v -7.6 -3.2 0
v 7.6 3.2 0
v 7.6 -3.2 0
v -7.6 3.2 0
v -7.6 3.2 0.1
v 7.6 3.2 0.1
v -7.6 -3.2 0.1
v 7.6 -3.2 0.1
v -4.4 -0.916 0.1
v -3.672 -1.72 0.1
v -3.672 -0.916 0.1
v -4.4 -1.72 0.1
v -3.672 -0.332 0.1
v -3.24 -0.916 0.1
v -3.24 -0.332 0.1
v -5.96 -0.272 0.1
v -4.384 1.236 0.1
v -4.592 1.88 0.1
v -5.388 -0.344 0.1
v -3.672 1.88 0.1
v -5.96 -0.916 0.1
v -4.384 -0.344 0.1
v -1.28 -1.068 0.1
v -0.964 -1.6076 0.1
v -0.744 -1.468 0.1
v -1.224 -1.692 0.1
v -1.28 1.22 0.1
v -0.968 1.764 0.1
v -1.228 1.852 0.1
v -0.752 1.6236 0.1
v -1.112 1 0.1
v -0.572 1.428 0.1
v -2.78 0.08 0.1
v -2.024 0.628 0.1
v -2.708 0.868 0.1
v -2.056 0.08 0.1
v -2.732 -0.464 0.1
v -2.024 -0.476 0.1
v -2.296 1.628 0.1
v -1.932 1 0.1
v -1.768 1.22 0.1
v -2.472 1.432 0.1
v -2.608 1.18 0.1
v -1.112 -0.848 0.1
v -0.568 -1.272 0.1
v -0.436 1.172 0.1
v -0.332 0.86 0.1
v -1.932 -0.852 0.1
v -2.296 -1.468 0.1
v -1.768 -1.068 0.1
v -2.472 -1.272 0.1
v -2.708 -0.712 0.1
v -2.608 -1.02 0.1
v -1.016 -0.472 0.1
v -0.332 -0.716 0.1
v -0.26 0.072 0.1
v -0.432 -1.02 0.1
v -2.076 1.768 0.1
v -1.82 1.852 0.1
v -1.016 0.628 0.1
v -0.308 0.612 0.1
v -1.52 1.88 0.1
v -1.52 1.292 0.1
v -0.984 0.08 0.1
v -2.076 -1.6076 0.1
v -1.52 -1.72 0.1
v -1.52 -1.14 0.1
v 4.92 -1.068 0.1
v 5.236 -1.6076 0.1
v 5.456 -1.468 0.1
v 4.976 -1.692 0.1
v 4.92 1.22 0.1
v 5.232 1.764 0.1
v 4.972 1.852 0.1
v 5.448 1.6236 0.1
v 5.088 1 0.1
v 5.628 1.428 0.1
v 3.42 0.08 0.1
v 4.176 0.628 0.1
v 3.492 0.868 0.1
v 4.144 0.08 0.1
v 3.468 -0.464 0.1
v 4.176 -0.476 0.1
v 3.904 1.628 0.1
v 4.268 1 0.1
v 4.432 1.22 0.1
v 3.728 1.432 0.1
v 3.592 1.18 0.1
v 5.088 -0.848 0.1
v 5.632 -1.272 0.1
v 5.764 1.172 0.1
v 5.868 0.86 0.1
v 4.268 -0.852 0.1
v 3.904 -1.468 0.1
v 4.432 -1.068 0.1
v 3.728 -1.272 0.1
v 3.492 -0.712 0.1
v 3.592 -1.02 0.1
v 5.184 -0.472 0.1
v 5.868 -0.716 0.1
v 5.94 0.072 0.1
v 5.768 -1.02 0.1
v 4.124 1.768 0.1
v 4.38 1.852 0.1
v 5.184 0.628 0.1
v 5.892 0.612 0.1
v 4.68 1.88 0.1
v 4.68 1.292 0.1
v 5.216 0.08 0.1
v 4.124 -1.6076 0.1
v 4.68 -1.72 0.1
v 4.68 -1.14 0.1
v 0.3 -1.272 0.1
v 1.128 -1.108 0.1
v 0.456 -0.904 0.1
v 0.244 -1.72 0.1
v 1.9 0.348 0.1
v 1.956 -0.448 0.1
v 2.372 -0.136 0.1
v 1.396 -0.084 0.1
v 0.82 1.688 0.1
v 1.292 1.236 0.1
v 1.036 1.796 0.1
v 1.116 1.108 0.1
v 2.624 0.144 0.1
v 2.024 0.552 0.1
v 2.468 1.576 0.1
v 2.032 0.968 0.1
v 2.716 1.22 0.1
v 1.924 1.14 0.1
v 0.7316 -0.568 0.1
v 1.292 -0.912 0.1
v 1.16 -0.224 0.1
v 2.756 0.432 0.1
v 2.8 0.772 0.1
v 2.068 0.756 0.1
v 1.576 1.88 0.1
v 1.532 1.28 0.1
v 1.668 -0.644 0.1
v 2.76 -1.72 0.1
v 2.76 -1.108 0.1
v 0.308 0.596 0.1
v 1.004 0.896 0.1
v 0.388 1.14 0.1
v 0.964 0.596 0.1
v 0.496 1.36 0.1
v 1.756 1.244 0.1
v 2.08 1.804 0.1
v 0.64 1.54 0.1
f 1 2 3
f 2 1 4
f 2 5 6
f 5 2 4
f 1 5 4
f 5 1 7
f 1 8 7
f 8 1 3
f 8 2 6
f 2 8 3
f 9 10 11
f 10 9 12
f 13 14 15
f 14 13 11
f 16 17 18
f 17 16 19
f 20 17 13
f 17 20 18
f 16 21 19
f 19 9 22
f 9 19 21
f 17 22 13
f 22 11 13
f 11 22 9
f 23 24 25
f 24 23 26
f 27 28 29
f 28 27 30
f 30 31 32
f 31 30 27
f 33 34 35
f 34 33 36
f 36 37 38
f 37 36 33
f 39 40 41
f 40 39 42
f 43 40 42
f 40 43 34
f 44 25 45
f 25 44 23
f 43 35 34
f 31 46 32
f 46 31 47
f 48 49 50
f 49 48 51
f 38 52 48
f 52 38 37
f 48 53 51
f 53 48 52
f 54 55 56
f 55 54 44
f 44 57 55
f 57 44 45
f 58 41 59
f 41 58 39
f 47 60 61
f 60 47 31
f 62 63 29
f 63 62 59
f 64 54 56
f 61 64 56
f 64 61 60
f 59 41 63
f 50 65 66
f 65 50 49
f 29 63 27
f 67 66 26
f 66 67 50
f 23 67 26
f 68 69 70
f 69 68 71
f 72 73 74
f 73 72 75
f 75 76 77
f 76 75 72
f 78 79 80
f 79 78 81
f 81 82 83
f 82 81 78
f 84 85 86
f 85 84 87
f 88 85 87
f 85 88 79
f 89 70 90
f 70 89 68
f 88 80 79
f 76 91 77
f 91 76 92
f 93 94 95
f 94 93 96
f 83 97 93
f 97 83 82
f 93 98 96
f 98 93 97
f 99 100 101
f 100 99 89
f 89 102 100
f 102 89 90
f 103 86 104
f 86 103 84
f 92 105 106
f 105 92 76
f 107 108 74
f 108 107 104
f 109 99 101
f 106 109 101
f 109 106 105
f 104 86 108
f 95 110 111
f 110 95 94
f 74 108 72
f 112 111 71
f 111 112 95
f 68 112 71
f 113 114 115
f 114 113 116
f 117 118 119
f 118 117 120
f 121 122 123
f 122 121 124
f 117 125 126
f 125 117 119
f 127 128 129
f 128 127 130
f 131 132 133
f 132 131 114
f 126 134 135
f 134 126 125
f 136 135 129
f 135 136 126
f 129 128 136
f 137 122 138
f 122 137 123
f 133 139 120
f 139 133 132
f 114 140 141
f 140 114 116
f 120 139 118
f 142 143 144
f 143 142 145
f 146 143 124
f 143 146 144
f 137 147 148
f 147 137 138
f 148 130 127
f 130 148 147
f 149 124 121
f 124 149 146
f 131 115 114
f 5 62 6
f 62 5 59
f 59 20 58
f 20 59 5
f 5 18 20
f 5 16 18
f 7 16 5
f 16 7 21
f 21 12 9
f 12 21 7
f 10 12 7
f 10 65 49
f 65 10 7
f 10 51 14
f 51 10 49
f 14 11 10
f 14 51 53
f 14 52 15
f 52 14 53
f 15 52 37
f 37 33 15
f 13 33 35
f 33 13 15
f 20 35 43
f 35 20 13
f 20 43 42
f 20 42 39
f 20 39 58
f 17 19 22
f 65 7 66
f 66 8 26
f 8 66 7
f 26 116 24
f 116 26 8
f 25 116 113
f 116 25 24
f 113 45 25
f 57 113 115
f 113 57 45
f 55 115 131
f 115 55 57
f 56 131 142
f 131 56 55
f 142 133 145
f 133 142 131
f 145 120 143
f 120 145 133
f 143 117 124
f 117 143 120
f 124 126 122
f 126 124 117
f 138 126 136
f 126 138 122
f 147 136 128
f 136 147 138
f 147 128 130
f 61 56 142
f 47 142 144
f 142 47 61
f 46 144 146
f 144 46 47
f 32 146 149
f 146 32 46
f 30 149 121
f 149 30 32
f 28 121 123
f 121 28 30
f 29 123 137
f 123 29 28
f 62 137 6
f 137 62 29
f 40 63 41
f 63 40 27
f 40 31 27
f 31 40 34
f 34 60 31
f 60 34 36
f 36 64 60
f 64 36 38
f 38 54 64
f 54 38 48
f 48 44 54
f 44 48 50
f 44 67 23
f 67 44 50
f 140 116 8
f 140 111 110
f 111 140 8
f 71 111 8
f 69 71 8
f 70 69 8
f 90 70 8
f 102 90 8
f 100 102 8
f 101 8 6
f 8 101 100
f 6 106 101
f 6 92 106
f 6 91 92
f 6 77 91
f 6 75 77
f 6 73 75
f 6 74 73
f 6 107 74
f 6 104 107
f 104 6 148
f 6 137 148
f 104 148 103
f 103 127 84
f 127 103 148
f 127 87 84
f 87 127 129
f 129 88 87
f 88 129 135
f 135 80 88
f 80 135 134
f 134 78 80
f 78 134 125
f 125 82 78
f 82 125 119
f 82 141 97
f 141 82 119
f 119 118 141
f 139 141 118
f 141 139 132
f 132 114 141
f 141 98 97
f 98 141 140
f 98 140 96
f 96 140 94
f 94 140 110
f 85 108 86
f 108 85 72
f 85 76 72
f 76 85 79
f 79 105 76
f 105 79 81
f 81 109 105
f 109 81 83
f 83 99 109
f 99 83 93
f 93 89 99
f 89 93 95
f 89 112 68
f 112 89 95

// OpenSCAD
// file: ../p/box5-12.scad
use <../lib.scad>
function ldraw_lib__box5_12() = [
// 0 Box with 5 Faces without Any Edges
// 0 Name: box5-12.dat
// 0 Author: Chris Dee [cwdee]
// 0 !LDRAW_ORG Primitive UPDATE 2009-02
// 0 !LICENSE Licensed under CC BY 4.0 : see CAreadme.txt
// 
// 0 BFC CERTIFY CCW
  [0,"BFC","CERTIFY"],
  [0,"BFC","CCW"],
// 
// 0 !HISTORY 2009-09-03 [PTadmin] Official Update 2009-02
// 
// 
// 4 16 1 1 1 1 1 -1 -1 1 -1 -1 1 1
  [4,16,1,1,1,1,1,-1,-1,1,-1,-1,1,1],
// 4 16 -1 0 1 1 0 1 1 1 1 -1 1 1
  [4,16,-1,0,1,1,0,1,1,1,1,-1,1,1],
// 4 16 -1 0 -1 -1 0 1 -1 1 1 -1 1 -1
  [4,16,-1,0,-1,-1,0,1,-1,1,1,-1,1,-1],
// 4 16 1 0 -1 -1 0 -1 -1 1 -1 1 1 -1
  [4,16,1,0,-1,-1,0,-1,-1,1,-1,1,1,-1],
// 4 16 1 0 1 1 0 -1 1 1 -1 1 1 1
  [4,16,1,0,1,1,0,-1,1,1,-1,1,1,1],
// 0
];
module ldraw_lib__box5_12(step=0, col=false, unit=2/5, alt=false, line=0.2, solid=!$preview)
    makepoly(ldraw_lib__box5_12(), step=step, col=col, unit=unit, alt=alt, line=line, solid=solid);
ldraw_lib__box5_12(line=0.2);
// main file
use <../lib.scad>
use <../p/box5-12.scad>
function ldraw_lib__197885a() = [
// 0 Sticker  0.8 x  1.9 with White "4020" on Transparent Background
// 0 Name: 197885a.dat
// 0 Author: Takeshi Takahashi [RainbowDolphin]
// 0 !LDRAW_ORG Part UPDATE 2025-07
// 0 !LICENSE Licensed under CC BY 4.0 : see CAreadme.txt
// 
// 0 BFC CERTIFY CCW
  [0,"BFC","CERTIFY"],
  [0,"BFC","CCW"],
// 
// 0 !KEYWORDS Fire boat, Set 4020, ship
// 
// 0 !HISTORY 2025-07-27 [OrionP] Official Update 2025-07
// 
// 
// 1 16 0 -0.25 0 19 0 0 0 0.25 0 0 0 8 box5-12.dat
  [1,16,0,-0.25,0,19,0,0,0,0.25,0,0,0,8, ldraw_lib__box5_12()],
// 0 BFC NOCLIP
  [0,"BFC","NOCLIP"],
// 4 15 -11 -0.25 -4.3 -9.18 -0.25 -4.3 -9.18 -0.25 -2.29 -11 -0.25 -2.29
  [4,15,-11,-0.25,-4.3,-9.18,-0.25,-4.3,-9.18,-0.25,-2.29,-11,-0.25,-2.29],
// 4 15 -9.18 -0.25 -0.83 -9.18 -0.25 -2.29 -8.1 -0.25 -2.29 -8.1 -0.25 -0.83
  [4,15,-9.18,-0.25,-0.83,-9.18,-0.25,-2.29,-8.1,-0.25,-2.29,-8.1,-0.25,-0.83],
// 4 15 -13.47 -0.25 -0.86 -10.96 -0.25 3.09 -11.48 -0.25 4.7 -14.9 -0.25 -0.68
  [4,15,-13.47,-0.25,-0.86,-10.96,-0.25,3.09,-11.48,-0.25,4.7,-14.9,-0.25,-0.68],
// 4 15 -9.18 -0.25 4.7 -11.48 -0.25 4.7 -10.96 -0.25 3.09 -9.18 -0.25 -0.83
  [4,15,-9.18,-0.25,4.7,-11.48,-0.25,4.7,-10.96,-0.25,3.09,-9.18,-0.25,-0.83],
// 3 15 -14.9 -0.25 -0.68 -14.9 -0.25 -2.29 -13.47 -0.25 -0.86
  [3,15,-14.9,-0.25,-0.68,-14.9,-0.25,-2.29,-13.47,-0.25,-0.86],
// 4 15 -10.96 -0.25 -0.86 -13.47 -0.25 -0.86 -14.9 -0.25 -2.29 -11 -0.25 -2.29
  [4,15,-10.96,-0.25,-0.86,-13.47,-0.25,-0.86,-14.9,-0.25,-2.29,-11,-0.25,-2.29],
// 3 15 -10.96 -0.25 3.09 -10.96 -0.25 -0.86 -9.18 -0.25 -0.83
  [3,15,-10.96,-0.25,3.09,-10.96,-0.25,-0.86,-9.18,-0.25,-0.83],
// 4 15 -11 -0.25 -2.29 -9.18 -0.25 -2.29 -9.18 -0.25 -0.83 -10.96 -0.25 -0.86
  [4,15,-11,-0.25,-2.29,-9.18,-0.25,-2.29,-9.18,-0.25,-0.83,-10.96,-0.25,-0.86],
// 4 15 -1.86 -0.25 -3.67 -3.2 -0.25 -2.67 -3.06 -0.25 -4.23 -2.41 -0.25 -4.019
  [4,15,-1.86,-0.25,-3.67,-3.2,-0.25,-2.67,-3.06,-0.25,-4.23,-2.41,-0.25,-4.019],
// 4 15 -3.07 -0.25 4.63 -3.2 -0.25 3.05 -1.88 -0.25 4.059 -2.42 -0.25 4.41
  [4,15,-3.07,-0.25,4.63,-3.2,-0.25,3.05,-1.88,-0.25,4.059,-2.42,-0.25,4.41],
// 4 15 -1.43 -.25 3.57 -1.88 -.25 4.059 -3.2 -.25 3.05 -2.78 -.25 2.5
  [4,15,-1.43,-.25,3.57,-1.88,-.25,4.059,-3.2,-.25,3.05,-2.78,-.25,2.5],
// 4 15 -6.77 -0.25 2.17 -6.95 -0.25 0.2 -5.14 -0.25 0.2 -5.06 -0.25 1.57
  [4,15,-6.77,-0.25,2.17,-6.95,-0.25,0.2,-5.14,-0.25,0.2,-5.06,-0.25,1.57],
// 4 15 -6.95 -0.25 0.2 -6.83 -0.25 -1.16 -5.06 -0.25 -1.19 -5.14 -0.25 0.2
  [4,15,-6.95,-0.25,0.2,-6.83,-0.25,-1.16,-5.06,-0.25,-1.19,-5.14,-0.25,0.2],
// 4 15 -4.42 -0.25 3.05 -5.74 -0.25 4.07 -6.18 -0.25 3.58 -4.83 -0.25 2.5
  [4,15,-4.42,-0.25,3.05,-5.74,-0.25,4.07,-6.18,-0.25,3.58,-4.83,-0.25,2.5],
// 4 15 -4.83 -0.25 2.5 -6.18 -0.25 3.58 -6.52 -0.25 2.95 -5.06 -0.25 1.57
  [4,15,-4.83,-0.25,2.5,-6.18,-0.25,3.58,-6.52,-0.25,2.95,-5.06,-0.25,1.57],
// 4 15 -3.2 -0.25 -2.67 -1.86 -0.25 -3.67 -1.42 -0.25 -3.18 -2.78 -0.25 -2.12
  [4,15,-3.2,-0.25,-2.67,-1.86,-0.25,-3.67,-1.42,-0.25,-3.18,-2.78,-0.25,-2.12],
// 3 15 -6.52 -0.25 2.95 -6.77 -0.25 2.17 -5.06 -0.25 1.57
  [3,15,-6.52,-0.25,2.95,-6.77,-0.25,2.17,-5.06,-0.25,1.57],
// 4 15 -.83 -.25 2.15 -1.09 -.25 2.93 -1.43 -.25 3.57 -2.78 -.25 2.5
  [4,15,-.83,-.25,2.15,-1.09,-.25,2.93,-1.43,-.25,3.57,-2.78,-.25,2.5],
// 4 15 -4.42 -0.25 -2.67 -4.83 -0.25 -2.13 -6.18 -0.25 -3.18 -5.74 -0.25 -3.67
  [4,15,-4.42,-0.25,-2.67,-4.83,-0.25,-2.13,-6.18,-0.25,-3.18,-5.74,-0.25,-3.67],
// 4 15 -6.83 -.25 -1.16 -6.77 -.25 -1.78 -4.83 -.25 -2.13 -5.06 -.25 -1.19
  [4,15,-6.83,-.25,-1.16,-6.77,-.25,-1.78,-4.83,-.25,-2.13,-5.06,-.25,-1.19],
// 4 15 -6.77 -.25 -1.78 -6.52 -.25 -2.55 -6.18 -.25 -3.18 -4.83 -.25 -2.13
  [4,15,-6.77,-.25,-1.78,-6.52,-.25,-2.55,-6.18,-.25,-3.18,-4.83,-.25,-2.13],
// 4 15 -0.65 -0.25 0.18 -2.54 -0.25 -1.18 -2.78 -0.25 -2.12 -0.83 -0.25 -1.79
  [4,15,-0.65,-0.25,0.18,-2.54,-0.25,-1.18,-2.78,-0.25,-2.12,-0.83,-0.25,-1.79],
// 4 15 -1.42 -0.25 -3.18 -1.08 -0.25 -2.55 -0.83 -0.25 -1.79 -2.78 -0.25 -2.12
  [4,15,-1.42,-0.25,-3.18,-1.08,-0.25,-2.55,-0.83,-0.25,-1.79,-2.78,-0.25,-2.12],
// 4 15 -5.74 -0.25 4.07 -4.42 -0.25 3.05 -4.55 -0.25 4.63 -5.19 -0.25 4.42
  [4,15,-5.74,-0.25,4.07,-4.42,-0.25,3.05,-4.55,-0.25,4.63,-5.19,-0.25,4.42],
// 4 15 -2.78 -.25 2.5 -2.54 -.25 1.57 -.77 -.25 1.53 -.83 -.25 2.15
  [4,15,-2.78,-.25,2.5,-2.54,-.25,1.57,-.77,-.25,1.53,-.83,-.25,2.15],
// 4 15 -3.07 -0.25 4.63 -3.8 -0.25 4.7 -4.55 -0.25 4.63 -3.8 -0.25 3.23
  [4,15,-3.07,-0.25,4.63,-3.8,-0.25,4.7,-4.55,-0.25,4.63,-3.8,-0.25,3.23],
// 3 15 -2.46 -0.25 0.2 -2.54 -0.25 -1.18 -0.65 -0.25 0.18
  [3,15,-2.46,-0.25,0.2,-2.54,-0.25,-1.18,-0.65,-0.25,0.18],
// 4 15 -2.54 -0.25 1.57 -2.46 -0.25 0.2 -0.65 -0.25 0.18 -0.77 -0.25 1.53
  [4,15,-2.54,-0.25,1.57,-2.46,-0.25,0.2,-0.65,-0.25,0.18,-0.77,-0.25,1.53],
// 3 15 -4.55 -0.25 4.63 -4.42 -0.25 3.05 -3.8 -0.25 3.23
  [3,15,-4.55,-0.25,4.63,-4.42,-0.25,3.05,-3.8,-0.25,3.23],
// 4 15 -5.74 -0.25 -3.67 -5.19 -0.25 -4.019 -3.8 -0.25 -4.3 -4.42 -0.25 -2.67
  [4,15,-5.74,-0.25,-3.67,-5.19,-0.25,-4.019,-3.8,-0.25,-4.3,-4.42,-0.25,-2.67],
// 3 15 -3.07 -0.25 4.63 -3.8 -0.25 3.23 -3.2 -0.25 3.05
  [3,15,-3.07,-0.25,4.63,-3.8,-0.25,3.23,-3.2,-0.25,3.05],
// 4 15 -4.42 -0.25 -2.67 -3.8 -0.25 -4.3 -3.06 -0.25 -4.23 -3.8 -0.25 -2.85
  [4,15,-4.42,-0.25,-2.67,-3.8,-0.25,-4.3,-3.06,-0.25,-4.23,-3.8,-0.25,-2.85],
// 3 15 -3.2 -0.25 -2.67 -3.8 -0.25 -2.85 -3.06 -0.25 -4.23
  [3,15,-3.2,-0.25,-2.67,-3.8,-0.25,-2.85,-3.06,-0.25,-4.23],
// 4 15 13.64 -0.25 -3.67 12.3 -0.25 -2.67 12.44 -0.25 -4.23 13.09 -0.25 -4.019
  [4,15,13.64,-0.25,-3.67,12.3,-0.25,-2.67,12.44,-0.25,-4.23,13.09,-0.25,-4.019],
// 4 15 12.43 -0.25 4.63 12.3 -0.25 3.05 13.62 -0.25 4.059 13.08 -0.25 4.41
  [4,15,12.43,-0.25,4.63,12.3,-0.25,3.05,13.62,-0.25,4.059,13.08,-0.25,4.41],
// 4 15 14.07 -0.25 3.57 13.62 -0.25 4.059 12.3 -0.25 3.05 12.72 -0.25 2.5
  [4,15,14.07,-0.25,3.57,13.62,-0.25,4.059,12.3,-0.25,3.05,12.72,-0.25,2.5],
// 4 15 8.73 -0.25 2.17 8.55 -0.25 0.2 10.36 -0.25 0.2 10.44 -0.25 1.57
  [4,15,8.73,-0.25,2.17,8.55,-0.25,0.2,10.36,-0.25,0.2,10.44,-0.25,1.57],
// 4 15 8.55 -0.25 0.2 8.67 -0.25 -1.16 10.44 -0.25 -1.19 10.36 -0.25 0.2
  [4,15,8.55,-0.25,0.2,8.67,-0.25,-1.16,10.44,-0.25,-1.19,10.36,-0.25,0.2],
// 4 15 11.08 -0.25 3.05 9.76 -0.25 4.07 9.32 -0.25 3.58 10.67 -0.25 2.5
  [4,15,11.08,-0.25,3.05,9.76,-0.25,4.07,9.32,-0.25,3.58,10.67,-0.25,2.5],
// 4 15 10.67 -0.25 2.5 9.32 -0.25 3.58 8.98 -0.25 2.95 10.44 -0.25 1.57
  [4,15,10.67,-0.25,2.5,9.32,-0.25,3.58,8.98,-0.25,2.95,10.44,-0.25,1.57],
// 4 15 12.3 -0.25 -2.67 13.64 -0.25 -3.67 14.08 -0.25 -3.18 12.72 -0.25 -2.12
  [4,15,12.3,-0.25,-2.67,13.64,-0.25,-3.67,14.08,-0.25,-3.18,12.72,-0.25,-2.12],
// 3 15 8.98 -0.25 2.95 8.73 -0.25 2.17 10.44 -0.25 1.57
  [3,15,8.98,-0.25,2.95,8.73,-0.25,2.17,10.44,-0.25,1.57],
// 4 15 14.67 -0.25 2.15 14.41 -0.25 2.93 14.07 -0.25 3.57 12.72 -0.25 2.5
  [4,15,14.67,-0.25,2.15,14.41,-0.25,2.93,14.07,-0.25,3.57,12.72,-0.25,2.5],
// 4 15 11.08 -0.25 -2.67 10.67 -0.25 -2.13 9.32 -0.25 -3.18 9.76 -0.25 -3.67
  [4,15,11.08,-0.25,-2.67,10.67,-0.25,-2.13,9.32,-0.25,-3.18,9.76,-0.25,-3.67],
// 4 15 8.67 -0.25 -1.16 8.73 -0.25 -1.78 10.67 -0.25 -2.13 10.44 -0.25 -1.19
  [4,15,8.67,-0.25,-1.16,8.73,-0.25,-1.78,10.67,-0.25,-2.13,10.44,-0.25,-1.19],
// 4 15 8.73 -0.25 -1.78 8.98 -0.25 -2.55 9.32 -0.25 -3.18 10.67 -0.25 -2.13
  [4,15,8.73,-0.25,-1.78,8.98,-0.25,-2.55,9.32,-0.25,-3.18,10.67,-0.25,-2.13],
// 4 15 14.85 -0.25 0.18 12.96 -0.25 -1.18 12.72 -0.25 -2.12 14.67 -0.25 -1.79
  [4,15,14.85,-0.25,0.18,12.96,-0.25,-1.18,12.72,-0.25,-2.12,14.67,-0.25,-1.79],
// 4 15 14.08 -0.25 -3.18 14.42 -0.25 -2.55 14.67 -0.25 -1.79 12.72 -0.25 -2.12
  [4,15,14.08,-0.25,-3.18,14.42,-0.25,-2.55,14.67,-0.25,-1.79,12.72,-0.25,-2.12],
// 4 15 9.76 -0.25 4.07 11.08 -0.25 3.05 10.95 -0.25 4.63 10.31 -0.25 4.42
  [4,15,9.76,-0.25,4.07,11.08,-0.25,3.05,10.95,-0.25,4.63,10.31,-0.25,4.42],
// 4 15 12.72 -0.25 2.5 12.96 -0.25 1.57 14.73 -0.25 1.53 14.67 -0.25 2.15
  [4,15,12.72,-0.25,2.5,12.96,-0.25,1.57,14.73,-0.25,1.53,14.67,-0.25,2.15],
// 4 15 12.43 -0.25 4.63 11.7 -0.25 4.7 10.95 -0.25 4.63 11.7 -0.25 3.23
  [4,15,12.43,-0.25,4.63,11.7,-0.25,4.7,10.95,-0.25,4.63,11.7,-0.25,3.23],
// 3 15 13.04 -0.25 0.2 12.96 -0.25 -1.18 14.85 -0.25 0.18
  [3,15,13.04,-0.25,0.2,12.96,-0.25,-1.18,14.85,-0.25,0.18],
// 4 15 12.96 -0.25 1.57 13.04 -0.25 0.2 14.85 -0.25 0.18 14.73 -0.25 1.53
  [4,15,12.96,-0.25,1.57,13.04,-0.25,0.2,14.85,-0.25,0.18,14.73,-0.25,1.53],
// 3 15 10.95 -0.25 4.63 11.08 -0.25 3.05 11.7 -0.25 3.23
  [3,15,10.95,-0.25,4.63,11.08,-0.25,3.05,11.7,-0.25,3.23],
// 4 15 9.76 -0.25 -3.67 10.31 -0.25 -4.019 11.7 -0.25 -4.3 11.08 -0.25 -2.67
  [4,15,9.76,-0.25,-3.67,10.31,-0.25,-4.019,11.7,-0.25,-4.3,11.08,-0.25,-2.67],
// 3 15 12.43 -0.25 4.63 11.7 -0.25 3.23 12.3 -0.25 3.05
  [3,15,12.43,-0.25,4.63,11.7,-0.25,3.23,12.3,-0.25,3.05],
// 4 15 11.08 -0.25 -2.67 11.7 -0.25 -4.3 12.44 -0.25 -4.23 11.7 -0.25 -2.85
  [4,15,11.08,-0.25,-2.67,11.7,-0.25,-4.3,12.44,-0.25,-4.23,11.7,-0.25,-2.85],
// 3 15 12.3 -0.25 -2.67 11.7 -0.25 -2.85 12.44 -0.25 -4.23
  [3,15,12.3,-0.25,-2.67,11.7,-0.25,-2.85,12.44,-0.25,-4.23],
// 4 15 1.14 -0.25 -2.26 0.75 -0.25 -3.18 0.61 -0.25 -4.3 2.82 -0.25 -2.77
  [4,15,1.14,-0.25,-2.26,0.75,-0.25,-3.18,0.61,-0.25,-4.3,2.82,-0.25,-2.77],
// 4 15 3.49 -0.25 -0.21 4.89 -0.25 -1.12 5.93 -0.25 -0.34 4.75 -0.25 0.87
  [4,15,3.49,-0.25,-0.21,4.89,-0.25,-1.12,5.93,-0.25,-0.34,4.75,-0.25,0.87],
// 4 15 2.59 -0.25 4.49 2.05 -0.25 4.22 2.79 -0.25 2.77 3.23 -0.25 3.09
  [4,15,2.59,-0.25,4.49,2.05,-0.25,4.22,2.79,-0.25,2.77,3.23,-0.25,3.09],
// 4 15 5.93 -0.25 -0.34 6.56 -0.25 0.36 5.06 -0.25 1.38 4.75 -0.25 0.87
  [4,15,5.93,-0.25,-0.34,6.56,-0.25,0.36,5.06,-0.25,1.38,4.75,-0.25,0.87],
// 4 15 4.81 -0.25 2.85 5.08 -0.25 2.42 6.79 -0.25 3.05 6.17 -0.25 3.94
  [4,15,4.81,-0.25,2.85,5.08,-0.25,2.42,6.79,-0.25,3.05,6.17,-0.25,3.94],
// 4 15 2.9 -0.25 -0.56 1.829 -0.25 -1.42 2.82 -0.25 -2.77 3.23 -0.25 -2.28
  [4,15,2.9,-0.25,-0.56,1.829,-0.25,-1.42,2.82,-0.25,-2.77,3.23,-0.25,-2.28],
// 4 15 5.06 -0.25 1.38 6.56 -0.25 0.36 6.89 -0.25 1.08 7 -0.25 1.93
  [4,15,5.06,-0.25,1.38,6.56,-0.25,0.36,6.89,-0.25,1.08,7,-0.25,1.93],
// 4 15 5.17 -0.25 1.89 5.06 -0.25 1.38 7 -0.25 1.93 6.79 -0.25 3.05
  [4,15,5.17,-0.25,1.89,5.06,-0.25,1.38,7,-0.25,1.93,6.79,-0.25,3.05],
// 3 15 6.79 -0.25 3.05 5.08 -0.25 2.42 5.17 -0.25 1.89
  [3,15,6.79,-0.25,3.05,5.08,-0.25,2.42,5.17,-0.25,1.89],
// 4 15 3.83 -0.25 3.2 3.94 -0.25 4.7 2.59 -0.25 4.49 3.23 -0.25 3.09
  [4,15,3.83,-0.25,3.2,3.94,-0.25,4.7,2.59,-0.25,4.49,3.23,-0.25,3.09],
// 4 15 3.49 -0.25 -0.21 2.9 -0.25 -0.56 3.23 -0.25 -2.28 4.17 -0.25 -1.61
  [4,15,3.49,-0.25,-0.21,2.9,-0.25,-0.56,3.23,-0.25,-2.28,4.17,-0.25,-1.61],
// 4 15 2.82 -0.25 -2.77 0.61 -0.25 -4.3 6.9 -0.25 -4.3 6.9 -0.25 -2.77
  [4,15,2.82,-0.25,-2.77,0.61,-0.25,-4.3,6.9,-0.25,-4.3,6.9,-0.25,-2.77],
// 3 15 3.49 -0.25 -0.21 4.17 -0.25 -1.61 4.89 -0.25 -1.12
  [3,15,3.49,-0.25,-0.21,4.17,-0.25,-1.61,4.89,-0.25,-1.12],
// 4 15 0.97 -0.25 2.85 0.77 -0.25 1.49 2.41 -0.25 1.49 2.51 -0.25 2.24
  [4,15,0.97,-0.25,2.85,0.77,-0.25,1.49,2.41,-0.25,1.49,2.51,-0.25,2.24],
// 4 15 2.79 -0.25 2.77 1.24 -0.25 3.4 0.97 -0.25 2.85 2.51 -0.25 2.24
  [4,15,2.79,-0.25,2.77,1.24,-0.25,3.4,0.97,-0.25,2.85,2.51,-0.25,2.24],
// 4 15 3.83 -0.25 3.2 4.39 -0.25 3.11 5.2 -0.25 4.51 3.94 -0.25 4.7
  [4,15,3.83,-0.25,3.2,4.39,-0.25,3.11,5.2,-0.25,4.51,3.94,-0.25,4.7],
// 4 15 6.17 -0.25 3.94 5.2 -0.25 4.51 4.39 -0.25 3.11 4.81 -0.25 2.85
  [4,15,6.17,-0.25,3.94,5.2,-0.25,4.51,4.39,-0.25,3.11,4.81,-0.25,2.85],
// 4 15 1.24 -0.25 3.4 2.79 -0.25 2.77 2.05 -0.25 4.22 1.6 -0.25 3.85
  [4,15,1.24,-0.25,3.4,2.79,-0.25,2.77,2.05,-0.25,4.22,1.6,-0.25,3.85],
// 3 15 1.829 -0.25 -1.42 1.14 -0.25 -2.26 2.82 -0.25 -2.77
  [3,15,1.829,-0.25,-1.42,1.14,-0.25,-2.26,2.82,-0.25,-2.77],
// 0 BFC CLIP
  [0,"BFC","CLIP"],
// 4 16 -3.8 -0.25 4.7 19 -0.25 8 -19 -0.25 8 -4.55 -0.25 4.63
  [4,16,-3.8,-0.25,4.7,19,-0.25,8,-19,-0.25,8,-4.55,-0.25,4.63],
// 4 16 -5.19 -0.25 4.42 -4.55 -0.25 4.63 -19 -0.25 8 -9.18 -0.25 4.7
  [4,16,-5.19,-0.25,4.42,-4.55,-0.25,4.63,-19,-0.25,8,-9.18,-0.25,4.7],
// 3 16 -19 -0.25 8 -11.48 -0.25 4.7 -9.18 -0.25 4.7
  [3,16,-19,-0.25,8,-11.48,-0.25,4.7,-9.18,-0.25,4.7],
// 3 16 -19 -0.25 8 -14.9 -0.25 -0.68 -11.48 -0.25 4.7
  [3,16,-19,-0.25,8,-14.9,-0.25,-0.68,-11.48,-0.25,4.7],
// 4 16 -14.9 -0.25 -0.68 -19 -0.25 8 -19 -0.25 -8 -14.9 -0.25 -2.29
  [4,16,-14.9,-0.25,-0.68,-19,-0.25,8,-19,-0.25,-8,-14.9,-0.25,-2.29],
// 4 16 -11 -0.25 -2.29 -14.9 -0.25 -2.29 -19 -0.25 -8 -11 -0.25 -4.3
  [4,16,-11,-0.25,-2.29,-14.9,-0.25,-2.29,-19,-0.25,-8,-11,-0.25,-4.3],
// 3 16 -9.18 -0.25 -4.3 -11 -0.25 -4.3 -19 -0.25 -8
  [3,16,-9.18,-0.25,-4.3,-11,-0.25,-4.3,-19,-0.25,-8],
// 4 16 -9.18 -0.25 -4.3 -19 -0.25 -8 -5.19 -0.25 -4.019 -5.74 -0.25 -3.67
  [4,16,-9.18,-0.25,-4.3,-19,-0.25,-8,-5.19,-0.25,-4.019,-5.74,-0.25,-3.67],
// 4 16 -9.18 -0.25 -4.3 -5.74 -0.25 -3.67 -6.18 -0.25 -3.18 -8.1 -0.25 -2.29
  [4,16,-9.18,-0.25,-4.3,-5.74,-0.25,-3.67,-6.18,-0.25,-3.18,-8.1,-0.25,-2.29],
// 3 16 -8.1 -0.25 -2.29 -9.18 -0.25 -2.29 -9.18 -0.25 -4.3
  [3,16,-8.1,-0.25,-2.29,-9.18,-0.25,-2.29,-9.18,-0.25,-4.3],
// 3 16 -8.1 -0.25 -2.29 -6.18 -0.25 -3.18 -6.52 -0.25 -2.55
  [3,16,-8.1,-0.25,-2.29,-6.18,-0.25,-3.18,-6.52,-0.25,-2.55],
// 4 16 -8.1 -.25 -2.29 -6.52 -.25 -2.55 -6.77 -.25 -1.78 -8.1 -.25 -.83
  [4,16,-8.1,-.25,-2.29,-6.52,-.25,-2.55,-6.77,-.25,-1.78,-8.1,-.25,-.83],
// 3 16 -8.1 -.25 -.83 -6.77 -.25 -1.78 -6.83 -.25 -1.16
  [3,16,-8.1,-.25,-.83,-6.77,-.25,-1.78,-6.83,-.25,-1.16],
// 3 16 -6.83 -.25 -1.16 -6.95 -.25 .2 -8.1 -.25 -.83
  [3,16,-6.83,-.25,-1.16,-6.95,-.25,.2,-8.1,-.25,-.83],
// 4 16 -8.1 -0.25 -0.83 -6.95 -0.25 0.2 -6.77 -0.25 2.17 -9.18 -0.25 -0.83
  [4,16,-8.1,-0.25,-0.83,-6.95,-0.25,0.2,-6.77,-0.25,2.17,-9.18,-0.25,-0.83],
// 4 16 -9.18 -0.25 4.7 -9.18 -0.25 -0.83 -6.77 -0.25 2.17 -6.52 -0.25 2.95
  [4,16,-9.18,-0.25,4.7,-9.18,-0.25,-0.83,-6.77,-0.25,2.17,-6.52,-0.25,2.95],
// 3 16 -9.18 -0.25 4.7 -6.52 -0.25 2.95 -6.18 -0.25 3.58
  [3,16,-9.18,-0.25,4.7,-6.52,-0.25,2.95,-6.18,-0.25,3.58],
// 3 16 -9.18 -0.25 4.7 -6.18 -0.25 3.58 -5.74 -0.25 4.07
  [3,16,-9.18,-0.25,4.7,-6.18,-0.25,3.58,-5.74,-0.25,4.07],
// 3 16 -9.18 -0.25 4.7 -5.74 -0.25 4.07 -5.19 -0.25 4.42
  [3,16,-9.18,-0.25,4.7,-5.74,-0.25,4.07,-5.19,-0.25,4.42],
// 3 16 -10.96 -0.25 3.09 -13.47 -0.25 -0.86 -10.96 -0.25 -0.86
  [3,16,-10.96,-0.25,3.09,-13.47,-0.25,-0.86,-10.96,-0.25,-0.86],
// 3 16 -5.19 -0.25 -4.019 -19 -0.25 -8 -3.8 -0.25 -4.3
  [3,16,-5.19,-0.25,-4.019,-19,-0.25,-8,-3.8,-0.25,-4.3],
// 4 16 -3.8 -0.25 -4.3 -19 -0.25 -8 19 -0.25 -8 -3.06 -0.25 -4.23
  [4,16,-3.8,-0.25,-4.3,-19,-0.25,-8,19,-0.25,-8,-3.06,-0.25,-4.23],
// 4 16 -3.06 -0.25 -4.23 19 -0.25 -8 0.61 -0.25 -4.3 -2.41 -0.25 -4.019
  [4,16,-3.06,-0.25,-4.23,19,-0.25,-8,0.61,-0.25,-4.3,-2.41,-0.25,-4.019],
// 4 16 -1.86 -0.25 -3.67 -2.41 -0.25 -4.019 0.61 -0.25 -4.3 0.75 -0.25 -3.18
  [4,16,-1.86,-0.25,-3.67,-2.41,-0.25,-4.019,0.61,-0.25,-4.3,0.75,-0.25,-3.18],
// 3 16 0.75 -0.25 -3.18 -1.42 -0.25 -3.18 -1.86 -0.25 -3.67
  [3,16,0.75,-0.25,-3.18,-1.42,-0.25,-3.18,-1.86,-0.25,-3.67],
// 4 16 -1.08 -0.25 -2.55 -1.42 -0.25 -3.18 0.75 -0.25 -3.18 1.14 -0.25 -2.26
  [4,16,-1.08,-0.25,-2.55,-1.42,-0.25,-3.18,0.75,-0.25,-3.18,1.14,-0.25,-2.26],
// 4 16 -0.83 -0.25 -1.79 -1.08 -0.25 -2.55 1.14 -0.25 -2.26 1.829 -0.25 -1.42
  [4,16,-0.83,-0.25,-1.79,-1.08,-0.25,-2.55,1.14,-0.25,-2.26,1.829,-0.25,-1.42],
// 4 16 -0.65 -0.25 0.18 -0.83 -0.25 -1.79 1.829 -0.25 -1.42 0.77 -0.25 1.49
  [4,16,-0.65,-0.25,0.18,-0.83,-0.25,-1.79,1.829,-0.25,-1.42,0.77,-0.25,1.49],
// 4 16 2.41 -0.25 1.49 0.77 -0.25 1.49 1.829 -0.25 -1.42 2.9 -0.25 -0.56
  [4,16,2.41,-0.25,1.49,0.77,-0.25,1.49,1.829,-0.25,-1.42,2.9,-0.25,-0.56],
// 4 16 2.51 -0.25 2.24 2.41 -0.25 1.49 2.9 -0.25 -0.56 3.49 -0.25 -0.21
  [4,16,2.51,-0.25,2.24,2.41,-0.25,1.49,2.9,-0.25,-0.56,3.49,-0.25,-0.21],
// 4 16 2.79 -0.25 2.77 2.51 -0.25 2.24 3.49 -0.25 -0.21 4.75 -0.25 0.87
  [4,16,2.79,-0.25,2.77,2.51,-0.25,2.24,3.49,-0.25,-0.21,4.75,-0.25,0.87],
// 4 16 3.23 -0.25 3.09 2.79 -0.25 2.77 4.75 -0.25 0.87 5.06 -0.25 1.38
  [4,16,3.23,-0.25,3.09,2.79,-0.25,2.77,4.75,-0.25,0.87,5.06,-0.25,1.38],
// 4 16 3.83 -0.25 3.2 3.23 -0.25 3.09 5.06 -0.25 1.38 5.17 -0.25 1.89
  [4,16,3.83,-0.25,3.2,3.23,-0.25,3.09,5.06,-0.25,1.38,5.17,-0.25,1.89],
// 4 16 4.39 -0.25 3.11 3.83 -0.25 3.2 5.17 -0.25 1.89 5.08 -0.25 2.42
  [4,16,4.39,-0.25,3.11,3.83,-0.25,3.2,5.17,-0.25,1.89,5.08,-0.25,2.42],
// 3 16 4.39 -0.25 3.11 5.08 -0.25 2.42 4.81 -0.25 2.85
  [3,16,4.39,-0.25,3.11,5.08,-0.25,2.42,4.81,-0.25,2.85],
// 3 16 -0.77 -0.25 1.53 -0.65 -0.25 0.18 0.77 -0.25 1.49
  [3,16,-0.77,-0.25,1.53,-0.65,-0.25,0.18,0.77,-0.25,1.49],
// 4 16 -0.83 -0.25 2.15 -0.77 -0.25 1.53 0.77 -0.25 1.49 0.97 -0.25 2.85
  [4,16,-0.83,-0.25,2.15,-0.77,-0.25,1.53,0.77,-0.25,1.49,0.97,-0.25,2.85],
// 4 16 -1.09 -0.25 2.93 -0.83 -0.25 2.15 0.97 -0.25 2.85 1.24 -0.25 3.4
  [4,16,-1.09,-0.25,2.93,-0.83,-0.25,2.15,0.97,-0.25,2.85,1.24,-0.25,3.4],
// 4 16 -1.43 -0.25 3.57 -1.09 -0.25 2.93 1.24 -0.25 3.4 1.6 -0.25 3.85
  [4,16,-1.43,-0.25,3.57,-1.09,-0.25,2.93,1.24,-0.25,3.4,1.6,-0.25,3.85],
// 4 16 -1.88 -0.25 4.059 -1.43 -0.25 3.57 1.6 -0.25 3.85 2.05 -0.25 4.22
  [4,16,-1.88,-0.25,4.059,-1.43,-0.25,3.57,1.6,-0.25,3.85,2.05,-0.25,4.22],
// 4 16 -2.42 -0.25 4.41 -1.88 -0.25 4.059 2.05 -0.25 4.22 2.59 -0.25 4.49
  [4,16,-2.42,-0.25,4.41,-1.88,-0.25,4.059,2.05,-0.25,4.22,2.59,-0.25,4.49],
// 4 16 -3.07 -0.25 4.63 -2.42 -0.25 4.41 2.59 -0.25 4.49 3.94 -0.25 4.7
  [4,16,-3.07,-0.25,4.63,-2.42,-0.25,4.41,2.59,-0.25,4.49,3.94,-0.25,4.7],
// 4 16 -3.8 -0.25 4.7 -3.07 -0.25 4.63 3.94 -0.25 4.7 19 -0.25 8
  [4,16,-3.8,-0.25,4.7,-3.07,-0.25,4.63,3.94,-0.25,4.7,19,-0.25,8],
// 4 16 -3.2 -0.25 3.05 -3.8 -0.25 3.23 -4.42 -0.25 3.05 -4.83 -0.25 2.5
  [4,16,-3.2,-0.25,3.05,-3.8,-0.25,3.23,-4.42,-0.25,3.05,-4.83,-0.25,2.5],
// 4 16 -2.78 -.25 2.5 -3.2 -.25 3.05 -4.83 -.25 2.5 -5.06 -.25 1.57
  [4,16,-2.78,-.25,2.5,-3.2,-.25,3.05,-4.83,-.25,2.5,-5.06,-.25,1.57],
// 4 16 -2.54 -.25 1.57 -2.78 -.25 2.5 -5.06 -.25 1.57 -5.14 -.25 .2
  [4,16,-2.54,-.25,1.57,-2.78,-.25,2.5,-5.06,-.25,1.57,-5.14,-.25,.2],
// 4 16 -2.46 -0.25 0.2 -2.54 -0.25 1.57 -5.14 -0.25 0.2 -5.06 -0.25 -1.19
  [4,16,-2.46,-0.25,0.2,-2.54,-0.25,1.57,-5.14,-0.25,0.2,-5.06,-0.25,-1.19],
// 4 16 -2.54 -0.25 -1.18 -2.46 -0.25 0.2 -5.06 -0.25 -1.19 -4.83 -0.25 -2.13
  [4,16,-2.54,-0.25,-1.18,-2.46,-0.25,0.2,-5.06,-0.25,-1.19,-4.83,-0.25,-2.13],
// 4 16 -2.78 -0.25 -2.12 -2.54 -0.25 -1.18 -4.83 -0.25 -2.13 -4.42 -0.25 -2.67
  [4,16,-2.78,-0.25,-2.12,-2.54,-0.25,-1.18,-4.83,-0.25,-2.13,-4.42,-0.25,-2.67],
// 4 16 -3.2 -0.25 -2.67 -2.78 -0.25 -2.12 -4.42 -0.25 -2.67 -3.8 -0.25 -2.85
  [4,16,-3.2,-0.25,-2.67,-2.78,-0.25,-2.12,-4.42,-0.25,-2.67,-3.8,-0.25,-2.85],
// 3 16 6.9 -0.25 -4.3 0.61 -0.25 -4.3 19 -0.25 -8
  [3,16,6.9,-0.25,-4.3,0.61,-0.25,-4.3,19,-0.25,-8],
// 4 16 10.31 -0.25 -4.019 6.9 -0.25 -4.3 19 -0.25 -8 11.7 -0.25 -4.3
  [4,16,10.31,-0.25,-4.019,6.9,-0.25,-4.3,19,-0.25,-8,11.7,-0.25,-4.3],
// 3 16 12.44 -0.25 -4.23 11.7 -0.25 -4.3 19 -0.25 -8
  [3,16,12.44,-0.25,-4.23,11.7,-0.25,-4.3,19,-0.25,-8],
// 3 16 13.09 -0.25 -4.019 12.44 -0.25 -4.23 19 -0.25 -8
  [3,16,13.09,-0.25,-4.019,12.44,-0.25,-4.23,19,-0.25,-8],
// 3 16 13.64 -0.25 -3.67 13.09 -0.25 -4.019 19 -0.25 -8
  [3,16,13.64,-0.25,-3.67,13.09,-0.25,-4.019,19,-0.25,-8],
// 3 16 14.08 -0.25 -3.18 13.64 -0.25 -3.67 19 -0.25 -8
  [3,16,14.08,-0.25,-3.18,13.64,-0.25,-3.67,19,-0.25,-8],
// 3 16 14.42 -0.25 -2.55 14.08 -0.25 -3.18 19 -0.25 -8
  [3,16,14.42,-0.25,-2.55,14.08,-0.25,-3.18,19,-0.25,-8],
// 3 16 14.67 -0.25 -1.79 14.42 -0.25 -2.55 19 -0.25 -8
  [3,16,14.67,-0.25,-1.79,14.42,-0.25,-2.55,19,-0.25,-8],
// 4 16 14.85 -0.25 0.18 14.67 -0.25 -1.79 19 -0.25 -8 19 -0.25 8
  [4,16,14.85,-0.25,0.18,14.67,-0.25,-1.79,19,-0.25,-8,19,-0.25,8],
// 3 16 19 -0.25 8 14.73 -0.25 1.53 14.85 -0.25 0.18
  [3,16,19,-0.25,8,14.73,-0.25,1.53,14.85,-0.25,0.18],
// 3 16 19 -0.25 8 14.67 -0.25 2.15 14.73 -0.25 1.53
  [3,16,19,-0.25,8,14.67,-0.25,2.15,14.73,-0.25,1.53],
// 3 16 19 -0.25 8 14.41 -0.25 2.93 14.67 -0.25 2.15
  [3,16,19,-0.25,8,14.41,-0.25,2.93,14.67,-0.25,2.15],
// 3 16 19 -0.25 8 14.07 -0.25 3.57 14.41 -0.25 2.93
  [3,16,19,-0.25,8,14.07,-0.25,3.57,14.41,-0.25,2.93],
// 3 16 19 -0.25 8 13.62 -0.25 4.059 14.07 -0.25 3.57
  [3,16,19,-0.25,8,13.62,-0.25,4.059,14.07,-0.25,3.57],
// 3 16 19 -0.25 8 13.08 -0.25 4.41 13.62 -0.25 4.059
  [3,16,19,-0.25,8,13.08,-0.25,4.41,13.62,-0.25,4.059],
// 3 16 19 -0.25 8 12.43 -0.25 4.63 13.08 -0.25 4.41
  [3,16,19,-0.25,8,12.43,-0.25,4.63,13.08,-0.25,4.41],
// 3 16 19 -0.25 8 11.7 -0.25 4.7 12.43 -0.25 4.63
  [3,16,19,-0.25,8,11.7,-0.25,4.7,12.43,-0.25,4.63],
// 4 16 10.95 -0.25 4.63 11.7 -0.25 4.7 19 -0.25 8 5.2 -0.25 4.51
  [4,16,10.95,-0.25,4.63,11.7,-0.25,4.7,19,-0.25,8,5.2,-0.25,4.51],
// 3 16 19 -0.25 8 3.94 -0.25 4.7 5.2 -0.25 4.51
  [3,16,19,-0.25,8,3.94,-0.25,4.7,5.2,-0.25,4.51],
// 3 16 10.95 -0.25 4.63 5.2 -0.25 4.51 10.31 -0.25 4.42
  [3,16,10.95,-0.25,4.63,5.2,-0.25,4.51,10.31,-0.25,4.42],
// 4 16 9.76 -0.25 4.07 10.31 -0.25 4.42 5.2 -0.25 4.51 6.17 -0.25 3.94
  [4,16,9.76,-0.25,4.07,10.31,-0.25,4.42,5.2,-0.25,4.51,6.17,-0.25,3.94],
// 4 16 9.32 -0.25 3.58 9.76 -0.25 4.07 6.17 -0.25 3.94 6.79 -0.25 3.05
  [4,16,9.32,-0.25,3.58,9.76,-0.25,4.07,6.17,-0.25,3.94,6.79,-0.25,3.05],
// 4 16 8.98 -0.25 2.95 9.32 -0.25 3.58 6.79 -0.25 3.05 7 -0.25 1.93
  [4,16,8.98,-0.25,2.95,9.32,-0.25,3.58,6.79,-0.25,3.05,7,-0.25,1.93],
// 4 16 8.73 -0.25 2.17 8.98 -0.25 2.95 7 -0.25 1.93 6.89 -0.25 1.08
  [4,16,8.73,-0.25,2.17,8.98,-0.25,2.95,7,-0.25,1.93,6.89,-0.25,1.08],
// 4 16 8.55 -0.25 0.2 8.73 -0.25 2.17 6.89 -0.25 1.08 6.56 -0.25 0.36
  [4,16,8.55,-0.25,0.2,8.73,-0.25,2.17,6.89,-0.25,1.08,6.56,-0.25,0.36],
// 4 16 8.67 -0.25 -1.16 8.55 -0.25 0.2 6.56 -0.25 0.36 5.93 -0.25 -0.34
  [4,16,8.67,-0.25,-1.16,8.55,-0.25,0.2,6.56,-0.25,0.36,5.93,-0.25,-0.34],
// 4 16 8.73 -0.25 -1.78 8.67 -0.25 -1.16 5.93 -0.25 -0.34 6.9 -0.25 -2.77
  [4,16,8.73,-0.25,-1.78,8.67,-0.25,-1.16,5.93,-0.25,-0.34,6.9,-0.25,-2.77],
// 3 16 5.93 -0.25 -0.34 4.89 -0.25 -1.12 6.9 -0.25 -2.77
  [3,16,5.93,-0.25,-0.34,4.89,-0.25,-1.12,6.9,-0.25,-2.77],
// 4 16 6.9 -0.25 -2.77 4.89 -0.25 -1.12 4.17 -0.25 -1.61 3.23 -0.25 -2.28
  [4,16,6.9,-0.25,-2.77,4.89,-0.25,-1.12,4.17,-0.25,-1.61,3.23,-0.25,-2.28],
// 3 16 3.23 -0.25 -2.28 2.82 -0.25 -2.77 6.9 -0.25 -2.77
  [3,16,3.23,-0.25,-2.28,2.82,-0.25,-2.77,6.9,-0.25,-2.77],
// 4 16 8.98 -0.25 -2.55 8.73 -0.25 -1.78 6.9 -0.25 -2.77 6.9 -0.25 -4.3
  [4,16,8.98,-0.25,-2.55,8.73,-0.25,-1.78,6.9,-0.25,-2.77,6.9,-0.25,-4.3],
// 3 16 8.98 -0.25 -2.55 6.9 -0.25 -4.3 9.32 -0.25 -3.18
  [3,16,8.98,-0.25,-2.55,6.9,-0.25,-4.3,9.32,-0.25,-3.18],
// 3 16 9.32 -0.25 -3.18 6.9 -0.25 -4.3 9.76 -0.25 -3.67
  [3,16,9.32,-0.25,-3.18,6.9,-0.25,-4.3,9.76,-0.25,-3.67],
// 3 16 9.76 -0.25 -3.67 6.9 -0.25 -4.3 10.31 -0.25 -4.019
  [3,16,9.76,-0.25,-3.67,6.9,-0.25,-4.3,10.31,-0.25,-4.019],
// 4 16 12.3 -0.25 3.05 11.7 -0.25 3.23 11.08 -0.25 3.05 10.67 -0.25 2.5
  [4,16,12.3,-0.25,3.05,11.7,-0.25,3.23,11.08,-0.25,3.05,10.67,-0.25,2.5],
// 4 16 12.72 -0.25 2.5 12.3 -0.25 3.05 10.67 -0.25 2.5 10.44 -0.25 1.57
  [4,16,12.72,-0.25,2.5,12.3,-0.25,3.05,10.67,-0.25,2.5,10.44,-0.25,1.57],
// 4 16 12.96 -0.25 1.57 12.72 -0.25 2.5 10.44 -0.25 1.57 10.36 -0.25 0.2
  [4,16,12.96,-0.25,1.57,12.72,-0.25,2.5,10.44,-0.25,1.57,10.36,-0.25,0.2],
// 4 16 13.04 -0.25 0.2 12.96 -0.25 1.57 10.36 -0.25 0.2 10.44 -0.25 -1.19
  [4,16,13.04,-0.25,0.2,12.96,-0.25,1.57,10.36,-0.25,0.2,10.44,-0.25,-1.19],
// 4 16 12.96 -0.25 -1.18 13.04 -0.25 0.2 10.44 -0.25 -1.19 10.67 -0.25 -2.13
  [4,16,12.96,-0.25,-1.18,13.04,-0.25,0.2,10.44,-0.25,-1.19,10.67,-0.25,-2.13],
// 4 16 12.72 -0.25 -2.12 12.96 -0.25 -1.18 10.67 -0.25 -2.13 11.08 -0.25 -2.67
  [4,16,12.72,-0.25,-2.12,12.96,-0.25,-1.18,10.67,-0.25,-2.13,11.08,-0.25,-2.67],
// 4 16 12.3 -0.25 -2.67 12.72 -0.25 -2.12 11.08 -0.25 -2.67 11.7 -0.25 -2.85
  [4,16,12.3,-0.25,-2.67,12.72,-0.25,-2.12,11.08,-0.25,-2.67,11.7,-0.25,-2.85],
];
module ldraw_lib__197885a(step=0, col=false, unit=2/5, alt=false, line=0.2, solid=!$preview)
    makepoly(ldraw_lib__197885a(), step=step, col=col, unit=unit, alt=alt, line=line, solid=solid);
ldraw_lib__197885a(line=0.2);
